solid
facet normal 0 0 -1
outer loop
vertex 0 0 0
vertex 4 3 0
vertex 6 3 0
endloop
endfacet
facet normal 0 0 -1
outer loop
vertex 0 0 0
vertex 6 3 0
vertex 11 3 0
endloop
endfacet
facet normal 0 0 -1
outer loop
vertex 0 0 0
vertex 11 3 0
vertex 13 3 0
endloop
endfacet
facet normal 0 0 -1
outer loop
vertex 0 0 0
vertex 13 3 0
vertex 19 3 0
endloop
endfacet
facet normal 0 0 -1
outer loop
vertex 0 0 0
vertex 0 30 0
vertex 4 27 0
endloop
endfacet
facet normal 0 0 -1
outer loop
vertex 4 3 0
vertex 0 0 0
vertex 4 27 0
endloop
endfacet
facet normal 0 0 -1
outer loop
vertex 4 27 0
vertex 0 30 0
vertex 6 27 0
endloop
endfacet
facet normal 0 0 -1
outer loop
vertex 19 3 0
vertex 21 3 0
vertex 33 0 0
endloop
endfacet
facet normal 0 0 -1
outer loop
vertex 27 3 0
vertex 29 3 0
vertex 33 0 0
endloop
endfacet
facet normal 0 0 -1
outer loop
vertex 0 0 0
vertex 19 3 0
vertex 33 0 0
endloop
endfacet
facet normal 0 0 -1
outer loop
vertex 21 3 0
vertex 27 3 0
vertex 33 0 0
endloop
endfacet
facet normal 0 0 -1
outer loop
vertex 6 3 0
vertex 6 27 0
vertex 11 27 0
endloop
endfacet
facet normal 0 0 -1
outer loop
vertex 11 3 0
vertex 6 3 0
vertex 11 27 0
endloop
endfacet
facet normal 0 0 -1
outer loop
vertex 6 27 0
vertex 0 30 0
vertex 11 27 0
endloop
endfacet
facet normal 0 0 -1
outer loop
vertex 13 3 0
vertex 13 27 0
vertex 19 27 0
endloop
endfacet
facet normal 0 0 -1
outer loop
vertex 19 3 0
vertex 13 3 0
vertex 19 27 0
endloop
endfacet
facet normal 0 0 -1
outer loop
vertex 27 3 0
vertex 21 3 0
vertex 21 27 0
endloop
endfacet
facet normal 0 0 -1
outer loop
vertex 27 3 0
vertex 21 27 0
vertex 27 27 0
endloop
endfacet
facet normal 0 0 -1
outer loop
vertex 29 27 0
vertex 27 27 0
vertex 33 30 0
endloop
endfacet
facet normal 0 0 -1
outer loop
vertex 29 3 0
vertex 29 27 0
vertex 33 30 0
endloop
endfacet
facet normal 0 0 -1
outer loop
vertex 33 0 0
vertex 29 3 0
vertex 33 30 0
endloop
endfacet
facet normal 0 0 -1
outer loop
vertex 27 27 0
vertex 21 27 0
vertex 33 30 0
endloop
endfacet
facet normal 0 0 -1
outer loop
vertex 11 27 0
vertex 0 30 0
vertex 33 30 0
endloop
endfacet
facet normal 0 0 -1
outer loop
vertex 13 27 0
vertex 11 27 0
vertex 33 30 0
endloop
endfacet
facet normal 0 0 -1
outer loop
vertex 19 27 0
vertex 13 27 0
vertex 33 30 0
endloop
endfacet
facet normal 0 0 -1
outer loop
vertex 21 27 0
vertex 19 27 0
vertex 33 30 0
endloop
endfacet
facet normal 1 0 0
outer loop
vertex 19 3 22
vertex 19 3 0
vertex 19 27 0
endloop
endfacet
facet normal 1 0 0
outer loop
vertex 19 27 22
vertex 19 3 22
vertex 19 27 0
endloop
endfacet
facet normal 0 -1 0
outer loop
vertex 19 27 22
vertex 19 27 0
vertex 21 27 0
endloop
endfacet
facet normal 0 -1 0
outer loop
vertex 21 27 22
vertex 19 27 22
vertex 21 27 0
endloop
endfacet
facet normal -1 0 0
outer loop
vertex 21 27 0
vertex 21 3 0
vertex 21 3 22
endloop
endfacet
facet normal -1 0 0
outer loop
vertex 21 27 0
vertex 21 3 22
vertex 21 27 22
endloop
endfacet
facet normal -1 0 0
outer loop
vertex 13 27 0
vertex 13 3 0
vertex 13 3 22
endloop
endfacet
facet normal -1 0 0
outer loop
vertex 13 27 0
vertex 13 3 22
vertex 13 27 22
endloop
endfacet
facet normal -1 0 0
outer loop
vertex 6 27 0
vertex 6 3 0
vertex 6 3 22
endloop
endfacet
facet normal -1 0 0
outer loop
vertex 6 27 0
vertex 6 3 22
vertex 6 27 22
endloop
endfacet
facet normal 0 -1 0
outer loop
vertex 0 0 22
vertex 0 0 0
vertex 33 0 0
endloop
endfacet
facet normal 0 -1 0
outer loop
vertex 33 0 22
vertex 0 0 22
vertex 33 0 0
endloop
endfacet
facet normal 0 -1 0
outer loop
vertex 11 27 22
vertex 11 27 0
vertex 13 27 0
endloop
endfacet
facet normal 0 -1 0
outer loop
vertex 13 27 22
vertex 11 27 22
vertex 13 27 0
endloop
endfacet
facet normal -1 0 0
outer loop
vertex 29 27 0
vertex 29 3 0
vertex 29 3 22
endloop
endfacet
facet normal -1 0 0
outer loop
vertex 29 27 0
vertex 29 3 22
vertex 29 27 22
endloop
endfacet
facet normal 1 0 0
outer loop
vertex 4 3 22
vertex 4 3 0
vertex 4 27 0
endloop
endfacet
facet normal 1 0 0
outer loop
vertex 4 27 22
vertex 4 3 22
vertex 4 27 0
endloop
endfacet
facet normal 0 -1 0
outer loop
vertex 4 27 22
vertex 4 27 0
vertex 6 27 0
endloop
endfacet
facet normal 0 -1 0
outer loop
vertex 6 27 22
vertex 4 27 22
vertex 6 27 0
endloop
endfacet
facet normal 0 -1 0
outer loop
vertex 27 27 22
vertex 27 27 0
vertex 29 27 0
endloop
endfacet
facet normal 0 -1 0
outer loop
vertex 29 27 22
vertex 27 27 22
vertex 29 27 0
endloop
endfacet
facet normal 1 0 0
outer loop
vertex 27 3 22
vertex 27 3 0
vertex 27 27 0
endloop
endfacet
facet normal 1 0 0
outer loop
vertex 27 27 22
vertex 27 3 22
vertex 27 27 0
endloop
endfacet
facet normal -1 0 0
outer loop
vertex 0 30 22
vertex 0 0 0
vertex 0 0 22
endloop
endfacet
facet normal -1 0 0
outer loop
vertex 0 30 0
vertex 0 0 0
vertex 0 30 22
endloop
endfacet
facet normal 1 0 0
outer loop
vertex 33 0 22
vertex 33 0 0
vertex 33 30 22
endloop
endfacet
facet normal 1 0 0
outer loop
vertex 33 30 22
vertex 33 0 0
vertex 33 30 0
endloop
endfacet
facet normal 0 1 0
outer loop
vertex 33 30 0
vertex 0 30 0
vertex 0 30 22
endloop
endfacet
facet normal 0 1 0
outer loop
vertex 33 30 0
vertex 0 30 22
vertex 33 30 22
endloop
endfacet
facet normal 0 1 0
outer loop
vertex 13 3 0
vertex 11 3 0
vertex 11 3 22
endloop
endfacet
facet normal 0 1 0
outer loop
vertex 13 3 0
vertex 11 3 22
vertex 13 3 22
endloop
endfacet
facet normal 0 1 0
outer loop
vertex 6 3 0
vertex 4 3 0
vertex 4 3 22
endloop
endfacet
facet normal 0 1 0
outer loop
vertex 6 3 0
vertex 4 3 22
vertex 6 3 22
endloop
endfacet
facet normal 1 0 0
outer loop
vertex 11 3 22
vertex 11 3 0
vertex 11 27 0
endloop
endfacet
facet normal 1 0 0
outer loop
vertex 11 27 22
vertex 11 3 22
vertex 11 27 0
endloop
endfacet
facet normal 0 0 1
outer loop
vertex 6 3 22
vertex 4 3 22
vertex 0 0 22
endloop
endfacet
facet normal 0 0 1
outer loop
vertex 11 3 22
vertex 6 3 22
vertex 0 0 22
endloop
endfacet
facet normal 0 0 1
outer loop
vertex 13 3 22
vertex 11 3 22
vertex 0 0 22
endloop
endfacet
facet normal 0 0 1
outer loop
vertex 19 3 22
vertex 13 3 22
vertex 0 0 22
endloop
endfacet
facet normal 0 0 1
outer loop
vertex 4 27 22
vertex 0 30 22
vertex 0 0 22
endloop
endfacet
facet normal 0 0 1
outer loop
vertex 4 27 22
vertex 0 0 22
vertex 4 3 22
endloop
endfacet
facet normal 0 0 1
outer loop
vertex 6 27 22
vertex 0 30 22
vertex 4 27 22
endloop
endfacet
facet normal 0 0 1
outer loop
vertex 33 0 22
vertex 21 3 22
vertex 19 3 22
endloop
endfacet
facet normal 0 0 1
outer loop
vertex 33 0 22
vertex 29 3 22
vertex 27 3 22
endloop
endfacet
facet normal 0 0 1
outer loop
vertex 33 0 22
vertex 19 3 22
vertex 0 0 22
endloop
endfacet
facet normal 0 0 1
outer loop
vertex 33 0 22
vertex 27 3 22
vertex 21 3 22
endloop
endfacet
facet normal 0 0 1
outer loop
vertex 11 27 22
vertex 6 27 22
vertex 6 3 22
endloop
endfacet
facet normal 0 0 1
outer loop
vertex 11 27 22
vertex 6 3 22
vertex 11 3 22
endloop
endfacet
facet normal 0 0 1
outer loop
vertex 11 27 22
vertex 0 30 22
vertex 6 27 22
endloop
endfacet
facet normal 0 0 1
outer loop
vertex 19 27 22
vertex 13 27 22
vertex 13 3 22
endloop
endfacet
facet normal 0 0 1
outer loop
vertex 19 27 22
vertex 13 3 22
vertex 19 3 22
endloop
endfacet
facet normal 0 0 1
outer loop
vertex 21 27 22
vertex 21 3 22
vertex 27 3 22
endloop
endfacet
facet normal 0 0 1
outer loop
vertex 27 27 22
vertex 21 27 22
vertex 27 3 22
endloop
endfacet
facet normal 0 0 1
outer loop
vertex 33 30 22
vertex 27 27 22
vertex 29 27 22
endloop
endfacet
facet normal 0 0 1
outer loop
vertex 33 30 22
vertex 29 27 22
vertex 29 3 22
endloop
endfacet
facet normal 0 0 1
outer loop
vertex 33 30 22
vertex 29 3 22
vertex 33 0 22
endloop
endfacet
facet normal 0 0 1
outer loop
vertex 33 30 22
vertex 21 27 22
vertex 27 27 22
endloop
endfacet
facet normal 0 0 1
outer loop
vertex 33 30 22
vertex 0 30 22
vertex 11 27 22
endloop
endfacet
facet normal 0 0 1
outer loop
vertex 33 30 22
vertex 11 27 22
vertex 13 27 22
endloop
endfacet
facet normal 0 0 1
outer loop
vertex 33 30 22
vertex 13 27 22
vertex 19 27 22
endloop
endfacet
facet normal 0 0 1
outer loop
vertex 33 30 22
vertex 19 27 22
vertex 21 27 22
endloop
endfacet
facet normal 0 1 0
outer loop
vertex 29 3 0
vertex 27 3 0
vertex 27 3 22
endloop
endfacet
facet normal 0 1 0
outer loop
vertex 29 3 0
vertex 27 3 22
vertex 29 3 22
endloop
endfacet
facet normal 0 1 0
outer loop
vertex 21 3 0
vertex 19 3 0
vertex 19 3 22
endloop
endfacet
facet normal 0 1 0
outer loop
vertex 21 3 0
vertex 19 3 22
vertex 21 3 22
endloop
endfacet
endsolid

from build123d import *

# Parameters (mm, degrees)
BOX002_W     = 2
BOX002_H     = 24
BOX002_DEPTH = 25
BOX003_W     = 2
BOX003_H     = 24
BOX003_DEPTH = 25
BOX004_W     = 2
BOX004_H     = 24
BOX004_DEPTH = 25
BOX001_W     = 2
BOX001_H     = 24
BOX001_DEPTH = 25
BOX_W        = 33
BOX_H        = 30
BOX_DEPTH    = 22


with BuildPart() as cub002:
    # Box002 → Box002 (new body)
    with BuildSketch(Plane(origin=(27, 3, -1), x_dir=(1, 0, 0), z_dir=(0, 0, 1))):
        with Locations((1, 12)):
            Rectangle(BOX002_W, BOX002_H)
    extrude(amount=BOX002_DEPTH)


with BuildPart() as cub003:
    # Box003 → Box003 (new body)
    with BuildSketch(Plane(origin=(19, 3, -1), x_dir=(1, 0, 0), z_dir=(0, 0, 1))):
        with Locations((1, 12)):
            Rectangle(BOX003_W, BOX003_H)
    extrude(amount=BOX003_DEPTH)


with BuildPart() as cub004:
    # Box004 → Box004 (new body)
    with BuildSketch(Plane(origin=(11, 3, -1), x_dir=(1, 0, 0), z_dir=(0, 0, 1))):
        with Locations((1, 12)):
            Rectangle(BOX004_W, BOX004_H)
    extrude(amount=BOX004_DEPTH)


with BuildPart() as cub001:
    # Box001 → Box001 (new body)
    with BuildSketch(Plane(origin=(4, 3, -1), x_dir=(1, 0, 0), z_dir=(0, 0, 1))):
        with Locations((1, 12)):
            Rectangle(BOX001_W, BOX001_H)
    extrude(amount=BOX001_DEPTH)


with BuildPart() as cut003:
    # Box → Box (new body)
    with BuildSketch(Plane.XY):
        with Locations((16.5, 15)):
            Rectangle(BOX_W, BOX_H)
    extrude(amount=BOX_DEPTH)

    # Cut: cut Cub001
    add(cub001.part, mode=Mode.SUBTRACT)

    # Cut001: cut Cub004
    add(cub004.part, mode=Mode.SUBTRACT)

    # Cut002: cut Cub003
    add(cub003.part, mode=Mode.SUBTRACT)

    # Cut003: cut Cub002
    add(cub002.part, mode=Mode.SUBTRACT)


solid = cut003.part
